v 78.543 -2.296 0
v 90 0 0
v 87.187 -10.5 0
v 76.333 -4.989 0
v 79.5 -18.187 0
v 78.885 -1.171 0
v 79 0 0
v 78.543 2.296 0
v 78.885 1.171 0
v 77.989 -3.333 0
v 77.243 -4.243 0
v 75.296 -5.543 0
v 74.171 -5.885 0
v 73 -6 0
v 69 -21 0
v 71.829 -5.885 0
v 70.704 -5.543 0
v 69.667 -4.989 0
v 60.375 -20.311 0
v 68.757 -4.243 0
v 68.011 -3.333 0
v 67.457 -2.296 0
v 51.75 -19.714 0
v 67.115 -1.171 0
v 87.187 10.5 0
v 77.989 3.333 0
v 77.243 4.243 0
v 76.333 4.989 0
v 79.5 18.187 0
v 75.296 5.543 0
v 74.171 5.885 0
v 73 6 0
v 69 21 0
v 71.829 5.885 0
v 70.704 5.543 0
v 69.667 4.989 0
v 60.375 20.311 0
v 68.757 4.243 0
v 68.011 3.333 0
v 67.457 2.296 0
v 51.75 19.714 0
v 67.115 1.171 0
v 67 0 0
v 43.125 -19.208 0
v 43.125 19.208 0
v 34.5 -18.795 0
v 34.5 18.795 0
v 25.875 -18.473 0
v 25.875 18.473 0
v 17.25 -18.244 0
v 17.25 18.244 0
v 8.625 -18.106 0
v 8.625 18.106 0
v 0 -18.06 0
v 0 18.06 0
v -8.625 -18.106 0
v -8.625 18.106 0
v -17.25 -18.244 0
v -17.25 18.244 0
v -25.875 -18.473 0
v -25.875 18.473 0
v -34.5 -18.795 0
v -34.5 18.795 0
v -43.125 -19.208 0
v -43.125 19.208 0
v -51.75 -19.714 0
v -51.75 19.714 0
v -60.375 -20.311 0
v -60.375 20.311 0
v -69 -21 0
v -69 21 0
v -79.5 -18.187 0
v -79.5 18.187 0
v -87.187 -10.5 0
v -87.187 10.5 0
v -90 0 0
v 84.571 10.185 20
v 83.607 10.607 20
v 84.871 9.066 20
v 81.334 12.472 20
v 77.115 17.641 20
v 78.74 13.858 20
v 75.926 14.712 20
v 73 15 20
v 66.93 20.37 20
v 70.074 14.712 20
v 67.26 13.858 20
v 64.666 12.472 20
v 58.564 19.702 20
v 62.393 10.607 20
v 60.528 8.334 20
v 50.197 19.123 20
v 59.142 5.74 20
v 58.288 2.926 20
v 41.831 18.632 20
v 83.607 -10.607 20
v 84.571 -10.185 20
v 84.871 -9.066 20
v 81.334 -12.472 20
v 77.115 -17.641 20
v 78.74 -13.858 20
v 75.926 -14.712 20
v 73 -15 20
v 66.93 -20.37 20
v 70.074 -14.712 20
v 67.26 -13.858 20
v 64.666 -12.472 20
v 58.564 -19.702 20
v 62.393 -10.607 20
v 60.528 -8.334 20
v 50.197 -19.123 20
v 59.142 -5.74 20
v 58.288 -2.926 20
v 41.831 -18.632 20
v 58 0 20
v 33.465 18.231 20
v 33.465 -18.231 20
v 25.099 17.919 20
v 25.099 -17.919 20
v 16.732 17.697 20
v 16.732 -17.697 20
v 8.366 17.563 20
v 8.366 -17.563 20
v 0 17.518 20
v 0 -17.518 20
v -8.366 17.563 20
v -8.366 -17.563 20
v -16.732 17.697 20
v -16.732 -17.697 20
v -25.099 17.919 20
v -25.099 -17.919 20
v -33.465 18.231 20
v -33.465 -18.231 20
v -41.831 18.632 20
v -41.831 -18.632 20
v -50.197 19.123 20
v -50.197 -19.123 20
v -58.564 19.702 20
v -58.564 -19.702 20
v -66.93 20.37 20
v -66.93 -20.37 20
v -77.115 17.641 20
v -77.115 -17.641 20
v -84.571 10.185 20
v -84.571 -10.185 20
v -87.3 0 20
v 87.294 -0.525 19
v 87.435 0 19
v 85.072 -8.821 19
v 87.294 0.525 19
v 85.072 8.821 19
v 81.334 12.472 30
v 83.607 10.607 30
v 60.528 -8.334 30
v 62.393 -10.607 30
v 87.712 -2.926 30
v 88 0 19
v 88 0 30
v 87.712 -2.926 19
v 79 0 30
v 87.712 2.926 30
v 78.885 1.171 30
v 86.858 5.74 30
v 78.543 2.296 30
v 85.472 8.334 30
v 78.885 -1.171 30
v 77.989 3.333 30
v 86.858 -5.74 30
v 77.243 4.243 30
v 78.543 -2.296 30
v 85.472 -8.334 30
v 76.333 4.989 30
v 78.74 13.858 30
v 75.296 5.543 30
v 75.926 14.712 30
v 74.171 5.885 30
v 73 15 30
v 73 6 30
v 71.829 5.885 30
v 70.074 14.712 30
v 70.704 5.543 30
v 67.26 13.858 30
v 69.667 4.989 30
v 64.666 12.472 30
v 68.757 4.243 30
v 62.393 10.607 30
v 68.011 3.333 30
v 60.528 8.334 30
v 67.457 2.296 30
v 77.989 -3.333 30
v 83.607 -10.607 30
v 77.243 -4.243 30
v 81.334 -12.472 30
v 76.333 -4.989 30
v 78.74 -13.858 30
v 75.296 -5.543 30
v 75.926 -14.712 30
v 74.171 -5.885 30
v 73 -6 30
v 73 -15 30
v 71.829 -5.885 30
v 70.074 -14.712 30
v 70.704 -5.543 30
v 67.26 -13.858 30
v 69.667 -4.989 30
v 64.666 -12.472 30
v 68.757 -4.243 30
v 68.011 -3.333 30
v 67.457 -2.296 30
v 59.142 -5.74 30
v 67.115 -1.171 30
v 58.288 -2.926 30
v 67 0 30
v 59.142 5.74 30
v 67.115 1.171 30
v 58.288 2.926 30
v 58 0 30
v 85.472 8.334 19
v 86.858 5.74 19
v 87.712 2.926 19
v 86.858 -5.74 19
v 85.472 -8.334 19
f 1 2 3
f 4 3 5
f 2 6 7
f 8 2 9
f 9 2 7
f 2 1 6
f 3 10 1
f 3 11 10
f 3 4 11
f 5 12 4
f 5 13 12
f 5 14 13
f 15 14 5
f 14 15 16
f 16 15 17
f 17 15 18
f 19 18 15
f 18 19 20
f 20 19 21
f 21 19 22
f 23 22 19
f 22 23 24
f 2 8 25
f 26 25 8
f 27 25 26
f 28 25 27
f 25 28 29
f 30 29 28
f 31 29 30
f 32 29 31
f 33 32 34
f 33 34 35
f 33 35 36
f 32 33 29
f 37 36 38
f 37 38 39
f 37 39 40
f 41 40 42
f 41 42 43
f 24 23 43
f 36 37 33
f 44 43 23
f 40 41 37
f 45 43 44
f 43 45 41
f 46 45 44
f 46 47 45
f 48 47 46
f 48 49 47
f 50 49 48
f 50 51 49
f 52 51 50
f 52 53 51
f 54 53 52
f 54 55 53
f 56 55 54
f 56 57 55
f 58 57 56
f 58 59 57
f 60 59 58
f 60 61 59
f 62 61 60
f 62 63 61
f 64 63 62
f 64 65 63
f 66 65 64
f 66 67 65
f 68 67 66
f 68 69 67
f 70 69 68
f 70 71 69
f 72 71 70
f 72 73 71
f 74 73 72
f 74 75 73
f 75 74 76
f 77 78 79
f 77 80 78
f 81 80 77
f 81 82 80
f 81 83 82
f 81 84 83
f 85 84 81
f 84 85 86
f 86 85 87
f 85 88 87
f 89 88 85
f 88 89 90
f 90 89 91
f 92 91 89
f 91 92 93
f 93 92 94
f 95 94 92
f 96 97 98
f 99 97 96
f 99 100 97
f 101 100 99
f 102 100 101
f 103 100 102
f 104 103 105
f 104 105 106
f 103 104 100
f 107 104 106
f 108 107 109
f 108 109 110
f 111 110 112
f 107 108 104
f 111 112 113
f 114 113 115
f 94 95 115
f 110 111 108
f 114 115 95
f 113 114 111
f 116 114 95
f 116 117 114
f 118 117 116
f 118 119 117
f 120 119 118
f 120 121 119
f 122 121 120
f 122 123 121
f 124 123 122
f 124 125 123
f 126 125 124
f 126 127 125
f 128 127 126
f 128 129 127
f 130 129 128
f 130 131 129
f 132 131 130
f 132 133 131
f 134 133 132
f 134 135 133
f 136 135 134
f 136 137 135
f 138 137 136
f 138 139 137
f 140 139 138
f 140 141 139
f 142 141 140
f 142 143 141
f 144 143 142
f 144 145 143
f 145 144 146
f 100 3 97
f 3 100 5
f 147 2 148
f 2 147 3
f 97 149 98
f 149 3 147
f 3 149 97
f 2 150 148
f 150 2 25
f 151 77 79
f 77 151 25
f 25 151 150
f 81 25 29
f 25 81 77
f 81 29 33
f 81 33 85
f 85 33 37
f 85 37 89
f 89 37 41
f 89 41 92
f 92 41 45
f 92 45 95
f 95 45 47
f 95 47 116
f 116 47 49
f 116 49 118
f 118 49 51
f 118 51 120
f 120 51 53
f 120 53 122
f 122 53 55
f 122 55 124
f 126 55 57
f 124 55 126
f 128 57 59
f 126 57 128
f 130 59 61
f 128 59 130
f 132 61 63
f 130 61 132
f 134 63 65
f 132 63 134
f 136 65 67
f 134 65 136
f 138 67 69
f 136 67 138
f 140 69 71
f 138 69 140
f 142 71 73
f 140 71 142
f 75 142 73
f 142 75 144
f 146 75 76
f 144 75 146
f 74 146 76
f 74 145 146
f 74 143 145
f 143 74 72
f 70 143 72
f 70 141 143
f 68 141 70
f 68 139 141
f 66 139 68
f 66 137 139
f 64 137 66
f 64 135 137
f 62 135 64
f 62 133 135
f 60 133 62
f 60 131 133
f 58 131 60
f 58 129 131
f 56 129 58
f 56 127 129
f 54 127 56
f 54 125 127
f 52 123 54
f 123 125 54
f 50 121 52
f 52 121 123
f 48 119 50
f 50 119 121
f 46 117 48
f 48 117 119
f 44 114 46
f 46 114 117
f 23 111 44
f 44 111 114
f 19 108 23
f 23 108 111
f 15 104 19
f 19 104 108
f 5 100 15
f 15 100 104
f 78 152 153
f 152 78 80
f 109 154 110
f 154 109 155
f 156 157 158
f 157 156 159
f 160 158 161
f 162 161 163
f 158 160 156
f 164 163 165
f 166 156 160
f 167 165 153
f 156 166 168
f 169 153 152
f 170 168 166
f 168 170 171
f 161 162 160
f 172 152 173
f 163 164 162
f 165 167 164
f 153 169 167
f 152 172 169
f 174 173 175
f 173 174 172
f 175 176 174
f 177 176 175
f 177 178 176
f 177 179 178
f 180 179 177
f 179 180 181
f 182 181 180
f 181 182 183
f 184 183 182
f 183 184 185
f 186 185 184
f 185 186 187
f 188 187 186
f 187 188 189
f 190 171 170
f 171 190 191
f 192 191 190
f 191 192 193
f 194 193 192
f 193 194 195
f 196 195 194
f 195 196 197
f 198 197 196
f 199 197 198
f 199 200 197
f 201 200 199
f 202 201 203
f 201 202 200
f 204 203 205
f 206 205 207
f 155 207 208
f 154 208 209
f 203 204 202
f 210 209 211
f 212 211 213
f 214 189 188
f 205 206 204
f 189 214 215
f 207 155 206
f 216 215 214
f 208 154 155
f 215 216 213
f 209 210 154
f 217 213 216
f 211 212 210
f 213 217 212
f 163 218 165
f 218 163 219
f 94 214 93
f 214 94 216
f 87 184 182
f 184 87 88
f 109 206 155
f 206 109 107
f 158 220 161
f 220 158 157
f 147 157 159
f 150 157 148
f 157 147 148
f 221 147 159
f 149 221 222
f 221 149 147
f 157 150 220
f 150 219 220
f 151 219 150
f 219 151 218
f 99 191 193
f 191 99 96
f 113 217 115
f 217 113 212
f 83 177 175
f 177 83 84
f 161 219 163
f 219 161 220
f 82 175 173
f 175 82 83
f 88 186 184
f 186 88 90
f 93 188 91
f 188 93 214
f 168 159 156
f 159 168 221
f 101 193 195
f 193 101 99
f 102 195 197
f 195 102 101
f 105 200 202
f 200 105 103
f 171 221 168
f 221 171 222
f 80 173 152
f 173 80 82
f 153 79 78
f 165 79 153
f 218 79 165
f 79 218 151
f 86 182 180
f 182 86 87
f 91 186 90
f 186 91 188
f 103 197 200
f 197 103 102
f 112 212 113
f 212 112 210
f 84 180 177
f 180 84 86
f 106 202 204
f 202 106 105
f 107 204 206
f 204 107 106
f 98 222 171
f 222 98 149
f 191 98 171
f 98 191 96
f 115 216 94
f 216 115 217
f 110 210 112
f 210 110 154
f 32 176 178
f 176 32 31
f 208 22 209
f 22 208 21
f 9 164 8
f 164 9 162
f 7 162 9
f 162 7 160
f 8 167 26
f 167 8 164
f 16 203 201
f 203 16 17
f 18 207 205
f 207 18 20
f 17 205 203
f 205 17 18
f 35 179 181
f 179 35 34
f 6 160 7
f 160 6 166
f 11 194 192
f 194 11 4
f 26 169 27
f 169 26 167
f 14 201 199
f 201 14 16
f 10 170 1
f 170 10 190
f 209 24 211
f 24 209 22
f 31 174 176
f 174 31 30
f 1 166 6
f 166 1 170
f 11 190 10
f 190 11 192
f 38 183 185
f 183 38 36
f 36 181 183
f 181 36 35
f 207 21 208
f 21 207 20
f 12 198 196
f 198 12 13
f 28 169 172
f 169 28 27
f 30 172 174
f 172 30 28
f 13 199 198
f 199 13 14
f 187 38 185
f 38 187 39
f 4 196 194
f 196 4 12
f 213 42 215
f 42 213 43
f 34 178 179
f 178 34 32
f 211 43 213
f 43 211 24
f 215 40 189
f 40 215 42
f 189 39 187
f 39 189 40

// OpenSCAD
$fn = 32;

// ----------------------------------------------------------------------
// Handle: 180 x 42 mm grip, 20 mm thick
// ----------------------------------------------------------------------

// --- parameters (mm) ---
length = 180;             // grip length
width = 42;               // grip width
thickness = 20;           // grip thickness
waist = 0.86;             // width factor at the middle
draft = 0.97;             // top face scale of the extrusion
boss_d = 30;              // mounting boss diameter
boss_h = 10;              // mounting boss height
boss_hole_d = 12;         // screw clearance through the boss
boss_r = 73;              // boss centre from the grip centre

/* ergonomic grip outline, closed spline-like polygon in the XY plane */
grip = [[-69, 21], [-60.375, 20.311], [-51.75, 19.714], [-43.125, 19.208], [-34.5, 18.795], [-25.875, 18.473], [-17.25, 18.244], [-8.625, 18.106], [0, 18.06], [8.625, 18.106], [17.25, 18.244], [25.875, 18.473], [34.5, 18.795], [43.125, 19.208], [51.75, 19.714], [60.375, 20.311], [69, 21], [79.5, 18.187], [87.187, 10.5], [90, 0], [87.187, -10.5], [79.5, -18.187], [69, -21], [69, -21], [60.375, -20.311], [51.75, -19.714], [43.125, -19.208], [34.5, -18.795], [25.875, -18.473], [17.25, -18.244], [8.625, -18.106], [0, -18.06], [-8.625, -18.106], [-17.25, -18.244], [-25.875, -18.473], [-34.5, -18.795], [-43.125, -19.208], [-51.75, -19.714], [-60.375, -20.311], [-69, -21], [-79.5, -18.187], [-87.187, -10.5], [-90, 0], [-87.187, 10.5], [-79.5, 18.187], [-69, 21]];

module grip_body() {
  linear_extrude(height = thickness, scale = draft) polygon(grip);
}

module boss_body() {
  /* sunk 1 mm into the grip so the joint overlaps */
  translate([boss_r, 0, thickness - 1]) cylinder(h = boss_h + 1, d = boss_d);
}

difference() {
  union() {
    grip_body();
    boss_body();
  }
  translate([boss_r, 0, -1]) cylinder(h = thickness + boss_h + 2, d = boss_hole_d);
}
